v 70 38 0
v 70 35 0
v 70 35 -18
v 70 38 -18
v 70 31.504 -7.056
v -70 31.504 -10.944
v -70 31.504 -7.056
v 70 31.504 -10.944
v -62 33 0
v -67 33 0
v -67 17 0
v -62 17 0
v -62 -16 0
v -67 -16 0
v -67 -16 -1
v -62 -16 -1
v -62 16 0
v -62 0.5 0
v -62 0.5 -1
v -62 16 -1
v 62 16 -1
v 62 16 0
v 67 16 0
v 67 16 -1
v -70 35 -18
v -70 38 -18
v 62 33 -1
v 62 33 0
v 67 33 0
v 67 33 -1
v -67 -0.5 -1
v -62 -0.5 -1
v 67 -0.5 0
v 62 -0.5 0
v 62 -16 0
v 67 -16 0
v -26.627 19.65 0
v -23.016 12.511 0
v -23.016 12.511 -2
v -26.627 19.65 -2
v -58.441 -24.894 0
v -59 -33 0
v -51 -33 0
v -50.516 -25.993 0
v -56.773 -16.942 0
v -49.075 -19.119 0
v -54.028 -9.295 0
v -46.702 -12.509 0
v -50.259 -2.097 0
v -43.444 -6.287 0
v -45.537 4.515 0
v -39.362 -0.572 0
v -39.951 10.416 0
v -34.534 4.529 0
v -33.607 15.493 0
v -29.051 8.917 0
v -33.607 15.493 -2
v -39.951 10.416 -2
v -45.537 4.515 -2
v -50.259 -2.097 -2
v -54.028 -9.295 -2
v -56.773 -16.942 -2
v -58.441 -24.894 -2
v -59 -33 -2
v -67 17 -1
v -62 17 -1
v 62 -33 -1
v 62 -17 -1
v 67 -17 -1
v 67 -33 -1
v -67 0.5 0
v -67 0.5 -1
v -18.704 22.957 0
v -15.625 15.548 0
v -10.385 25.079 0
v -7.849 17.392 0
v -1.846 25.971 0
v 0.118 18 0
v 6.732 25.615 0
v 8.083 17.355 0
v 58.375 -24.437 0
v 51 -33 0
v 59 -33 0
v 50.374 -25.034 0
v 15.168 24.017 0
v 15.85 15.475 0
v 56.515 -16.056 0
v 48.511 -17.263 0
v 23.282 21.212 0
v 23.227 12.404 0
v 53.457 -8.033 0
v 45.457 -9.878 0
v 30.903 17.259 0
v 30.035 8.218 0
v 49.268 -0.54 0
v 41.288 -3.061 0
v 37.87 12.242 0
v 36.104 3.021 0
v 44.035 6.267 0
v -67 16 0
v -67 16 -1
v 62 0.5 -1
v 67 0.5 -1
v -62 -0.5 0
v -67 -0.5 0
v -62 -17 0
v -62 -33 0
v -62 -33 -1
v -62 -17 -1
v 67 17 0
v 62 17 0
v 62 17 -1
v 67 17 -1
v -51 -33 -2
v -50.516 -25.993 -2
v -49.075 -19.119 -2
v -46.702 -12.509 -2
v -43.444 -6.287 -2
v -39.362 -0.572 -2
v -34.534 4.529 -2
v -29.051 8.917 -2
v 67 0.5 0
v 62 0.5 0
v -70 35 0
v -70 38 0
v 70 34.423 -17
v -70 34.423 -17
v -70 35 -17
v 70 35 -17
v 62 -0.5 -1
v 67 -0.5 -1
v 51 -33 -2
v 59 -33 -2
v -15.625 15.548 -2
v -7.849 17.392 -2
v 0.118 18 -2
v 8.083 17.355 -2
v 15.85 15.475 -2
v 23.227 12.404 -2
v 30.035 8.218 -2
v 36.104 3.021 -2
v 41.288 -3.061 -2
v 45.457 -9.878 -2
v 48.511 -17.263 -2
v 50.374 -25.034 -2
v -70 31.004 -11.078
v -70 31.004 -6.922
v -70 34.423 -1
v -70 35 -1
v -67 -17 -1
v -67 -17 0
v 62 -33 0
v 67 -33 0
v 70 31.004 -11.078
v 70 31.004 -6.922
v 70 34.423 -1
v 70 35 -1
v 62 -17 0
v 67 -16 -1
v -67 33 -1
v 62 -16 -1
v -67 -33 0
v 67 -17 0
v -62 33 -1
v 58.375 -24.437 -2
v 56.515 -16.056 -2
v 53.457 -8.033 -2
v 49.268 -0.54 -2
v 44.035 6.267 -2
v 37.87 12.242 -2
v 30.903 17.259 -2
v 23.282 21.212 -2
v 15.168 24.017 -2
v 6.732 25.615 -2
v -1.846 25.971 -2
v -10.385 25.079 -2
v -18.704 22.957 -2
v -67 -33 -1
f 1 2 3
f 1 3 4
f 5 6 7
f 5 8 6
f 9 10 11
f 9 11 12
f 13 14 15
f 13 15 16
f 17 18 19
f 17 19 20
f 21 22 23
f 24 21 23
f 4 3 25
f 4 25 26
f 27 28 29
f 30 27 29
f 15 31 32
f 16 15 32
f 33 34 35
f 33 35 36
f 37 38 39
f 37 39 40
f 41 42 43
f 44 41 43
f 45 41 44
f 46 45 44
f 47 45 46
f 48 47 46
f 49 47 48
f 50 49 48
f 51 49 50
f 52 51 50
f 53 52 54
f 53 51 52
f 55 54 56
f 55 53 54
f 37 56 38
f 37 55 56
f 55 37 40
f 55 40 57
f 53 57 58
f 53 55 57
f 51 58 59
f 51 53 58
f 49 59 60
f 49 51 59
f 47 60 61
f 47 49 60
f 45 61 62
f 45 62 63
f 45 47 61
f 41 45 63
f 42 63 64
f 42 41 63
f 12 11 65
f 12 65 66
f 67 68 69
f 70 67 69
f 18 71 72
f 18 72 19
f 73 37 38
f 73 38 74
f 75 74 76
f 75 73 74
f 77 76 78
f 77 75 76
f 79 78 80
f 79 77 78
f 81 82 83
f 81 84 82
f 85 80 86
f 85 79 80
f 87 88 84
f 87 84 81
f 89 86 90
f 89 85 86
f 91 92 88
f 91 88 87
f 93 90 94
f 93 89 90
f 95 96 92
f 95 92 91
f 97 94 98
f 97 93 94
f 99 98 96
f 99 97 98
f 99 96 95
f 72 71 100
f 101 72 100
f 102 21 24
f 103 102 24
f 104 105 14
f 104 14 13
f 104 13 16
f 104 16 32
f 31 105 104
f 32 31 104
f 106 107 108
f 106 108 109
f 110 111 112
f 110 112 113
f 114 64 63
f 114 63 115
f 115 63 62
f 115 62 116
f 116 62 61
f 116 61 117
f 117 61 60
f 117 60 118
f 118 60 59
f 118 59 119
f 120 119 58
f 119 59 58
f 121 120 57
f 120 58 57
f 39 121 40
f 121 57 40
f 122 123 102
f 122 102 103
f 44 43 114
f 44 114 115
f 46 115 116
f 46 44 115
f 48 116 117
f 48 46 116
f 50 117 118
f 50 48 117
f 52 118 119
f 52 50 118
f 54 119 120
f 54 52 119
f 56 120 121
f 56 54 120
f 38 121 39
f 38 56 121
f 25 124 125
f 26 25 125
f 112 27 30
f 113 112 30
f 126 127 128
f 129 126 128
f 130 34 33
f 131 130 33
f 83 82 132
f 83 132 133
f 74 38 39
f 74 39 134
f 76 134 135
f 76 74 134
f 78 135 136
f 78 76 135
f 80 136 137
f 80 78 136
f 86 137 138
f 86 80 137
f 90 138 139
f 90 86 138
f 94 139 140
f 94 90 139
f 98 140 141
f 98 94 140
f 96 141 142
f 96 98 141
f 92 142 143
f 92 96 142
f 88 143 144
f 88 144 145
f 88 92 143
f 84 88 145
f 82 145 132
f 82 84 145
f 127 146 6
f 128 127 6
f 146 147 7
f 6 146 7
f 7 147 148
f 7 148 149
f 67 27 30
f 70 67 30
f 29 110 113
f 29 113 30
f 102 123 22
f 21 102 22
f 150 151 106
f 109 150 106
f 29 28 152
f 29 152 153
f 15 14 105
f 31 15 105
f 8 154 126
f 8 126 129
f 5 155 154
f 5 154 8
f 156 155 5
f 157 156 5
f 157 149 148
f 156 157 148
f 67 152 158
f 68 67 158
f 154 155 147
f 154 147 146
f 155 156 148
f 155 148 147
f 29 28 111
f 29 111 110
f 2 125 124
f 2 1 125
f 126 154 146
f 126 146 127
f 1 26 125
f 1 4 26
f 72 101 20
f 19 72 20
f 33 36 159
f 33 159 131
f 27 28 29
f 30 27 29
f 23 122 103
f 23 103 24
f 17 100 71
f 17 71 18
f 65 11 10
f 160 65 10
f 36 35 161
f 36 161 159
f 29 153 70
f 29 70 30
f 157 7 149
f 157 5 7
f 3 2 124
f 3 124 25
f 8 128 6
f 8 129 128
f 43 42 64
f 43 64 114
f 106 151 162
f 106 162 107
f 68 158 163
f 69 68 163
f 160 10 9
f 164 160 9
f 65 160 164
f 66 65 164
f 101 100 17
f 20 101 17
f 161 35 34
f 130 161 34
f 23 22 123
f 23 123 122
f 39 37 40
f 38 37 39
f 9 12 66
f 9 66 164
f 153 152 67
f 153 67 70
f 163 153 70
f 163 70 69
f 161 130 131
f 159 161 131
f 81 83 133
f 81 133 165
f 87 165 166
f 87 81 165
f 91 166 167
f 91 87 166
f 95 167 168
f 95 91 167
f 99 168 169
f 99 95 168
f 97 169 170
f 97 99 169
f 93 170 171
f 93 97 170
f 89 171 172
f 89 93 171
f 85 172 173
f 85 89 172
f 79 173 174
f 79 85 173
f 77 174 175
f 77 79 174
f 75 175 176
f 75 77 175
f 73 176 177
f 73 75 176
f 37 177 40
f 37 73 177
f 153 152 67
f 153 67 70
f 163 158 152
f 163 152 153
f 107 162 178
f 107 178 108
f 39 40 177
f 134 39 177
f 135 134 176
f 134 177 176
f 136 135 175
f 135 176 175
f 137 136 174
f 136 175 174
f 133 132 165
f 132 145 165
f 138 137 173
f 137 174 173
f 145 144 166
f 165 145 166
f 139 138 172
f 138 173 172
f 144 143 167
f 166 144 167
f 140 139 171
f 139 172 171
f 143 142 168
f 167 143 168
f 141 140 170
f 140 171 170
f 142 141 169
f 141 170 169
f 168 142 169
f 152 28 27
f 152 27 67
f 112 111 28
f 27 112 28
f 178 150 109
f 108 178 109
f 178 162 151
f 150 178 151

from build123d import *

# Parameters (mm, degrees)
F0_W     = 5
F0_H     = 16
F1_DEPTH = 1
F0_H_2   = 15.5
F2_DEPTH = 2
F0_H_3   = 1
F3_DEPTH = 1
F4_DEPTH = 2
F6_DEPTH = 70


with BuildPart() as f1:
    # F0 (on Top) → F1 (new body)
    with BuildSketch(Plane.XY):
        with Locations((-64.5, 25)):
            Rectangle(F0_W, F0_H)
    extrude(amount=-F1_DEPTH)


with BuildPart() as f1b:
    # F0 (on Top) → F1, piece 2 (new body)
    with BuildSketch(Plane.XY):
        with Locations((-64.5, 8.25)):
            Rectangle(F0_W, F0_H_2)
    extrude(amount=-F1_DEPTH)


with BuildPart() as f1c:
    # F0 (on Top) → F1, piece 3 (new body)
    with BuildSketch(Plane.XY):
        with Locations((-64.5, -8.25)):
            Rectangle(F0_W, F0_H_2)
    extrude(amount=-F1_DEPTH)


with BuildPart() as f1d:
    # F0 (on Top) → F1, piece 4 (new body)
    with BuildSketch(Plane.XY):
        with Locations((-64.5, -25)):
            Rectangle(F0_W, F0_H)
    extrude(amount=-F1_DEPTH)


with BuildPart() as f1e:
    # F0 (on Top) → F1, piece 5 (new body)
    with BuildSketch(Plane.XY):
        with Locations((64.5, 25)):
            Rectangle(F0_W, F0_H)
    extrude(amount=-F1_DEPTH)


with BuildPart() as f1f:
    # F0 (on Top) → F1, piece 6 (new body)
    with BuildSketch(Plane.XY):
        with Locations((64.5, 8.25)):
            Rectangle(F0_W, F0_H_2)
    extrude(amount=-F1_DEPTH)


with BuildPart() as f1g:
    # F0 (on Top) → F1, piece 7 (new body)
    with BuildSketch(Plane.XY):
        with Locations((64.5, -8.25)):
            Rectangle(F0_W, F0_H_2)
    extrude(amount=-F1_DEPTH)


with BuildPart() as f1h:
    # F0 (on Top) → F1, piece 8 (new body)
    with BuildSketch(Plane.XY):
        with Locations((64.5, -25)):
            Rectangle(F0_W, F0_H)
    extrude(amount=-F1_DEPTH)


with BuildPart() as f2:
    # F0 (on Top) → F2 (new body)
    with BuildSketch(Plane.XY):
        with BuildLine():
            Line((-23.0162111194, 12.5110319121), (-26.6265971774, 19.6500173101))
            ThreePointArc((-26.6265971774, 19.6500173101), (-50.2591744534, -2.0966768249), (-59, -33))
            Line((-59, -33), (-51, -33))
            ThreePointArc((-51, -33), (-43.4443711376, -6.2869579334), (-23.0162111194, 12.5110319121))
        make_face()
    extrude(amount=-F2_DEPTH)


with BuildPart() as f3:
    # F0 (on Top) → F3 (new body)
    with BuildSketch(Plane.XY):
        with Locations((64.5, 25)):
            Rectangle(F0_W, F0_H)
        with Locations((64.5, 16.5)):
            Rectangle(F0_W, F0_H_3)
        with Locations((64.5, 8.25)):
            Rectangle(F0_W, F0_H_2)
        with Locations((64.5, 0)):
            Rectangle(F0_W, F0_H_3)
        with Locations((64.5, -8.25)):
            Rectangle(F0_W, F0_H_2)
        with Locations((64.5, -16.5)):
            Rectangle(F0_W, F0_H_3)
        with Locations((64.5, -25)):
            Rectangle(F0_W, F0_H)
    extrude(amount=-F3_DEPTH)


with BuildPart() as f4:
    # F0 (on Top) → F4 (new body)
    with BuildSketch(Plane.XY):
        with BuildLine():
            Line((51, -33), (59, -33))
            ThreePointArc((59, -33), (30.9033231751, 17.2591744534), (-26.6265971774, 19.6500173101))
            Line((-26.6265971774, 19.6500173101), (-23.0162111194, 12.5110319121))
            ThreePointArc((-23.0162111194, 12.5110319121), (26.7130420666, 10.4443711376), (51, -33))
        make_face()
    extrude(amount=-F4_DEPTH)


with BuildPart() as f6:
    # F5 (on Right) → F6 (new body, symmetric)
    with BuildSketch(Plane.YZ):
        Polygon((31.5038475773, -7.0555136271), (35, -1), (34.4226497308, -1), (31.0038475773, -6.9215390309), (31.0038475773, -7.9215390309), align=None)
        Polygon((34.4226497308, -17), (35, -17), (31.5038475773, -10.9444863729), (31.0038475773, -10.0784609691), (31.0038475773, -11.0784609691), align=None)
        Polygon((31.5038475773, -10.9444863729), (31.5038475773, -9), (31.0038475773, -9), (31.0038475773, -10.0784609691), align=None)
        Polygon((31.5038475773, -9), (31.5038475773, -7.0555136271), (31.0038475773, -7.9215390309), (31.0038475773, -9), align=None)
    extrude(amount=F6_DEPTH, both=True)


with BuildPart() as f6b:
    # F5 (on Right) → F6, piece 2 (new body, symmetric)
    with BuildSketch(Plane.YZ):
        Polygon((38, 0), (35, 0), (35, -1), (35, -9), (35, -17), (35, -18), (38, -18), align=None)
    extrude(amount=F6_DEPTH, both=True)


solid = Compound([f1.part, f1b.part, f1c.part, f1d.part, f1e.part, f1f.part, f1g.part, f1h.part, f2.part, f3.part, f4.part, f6.part, f6b.part])
